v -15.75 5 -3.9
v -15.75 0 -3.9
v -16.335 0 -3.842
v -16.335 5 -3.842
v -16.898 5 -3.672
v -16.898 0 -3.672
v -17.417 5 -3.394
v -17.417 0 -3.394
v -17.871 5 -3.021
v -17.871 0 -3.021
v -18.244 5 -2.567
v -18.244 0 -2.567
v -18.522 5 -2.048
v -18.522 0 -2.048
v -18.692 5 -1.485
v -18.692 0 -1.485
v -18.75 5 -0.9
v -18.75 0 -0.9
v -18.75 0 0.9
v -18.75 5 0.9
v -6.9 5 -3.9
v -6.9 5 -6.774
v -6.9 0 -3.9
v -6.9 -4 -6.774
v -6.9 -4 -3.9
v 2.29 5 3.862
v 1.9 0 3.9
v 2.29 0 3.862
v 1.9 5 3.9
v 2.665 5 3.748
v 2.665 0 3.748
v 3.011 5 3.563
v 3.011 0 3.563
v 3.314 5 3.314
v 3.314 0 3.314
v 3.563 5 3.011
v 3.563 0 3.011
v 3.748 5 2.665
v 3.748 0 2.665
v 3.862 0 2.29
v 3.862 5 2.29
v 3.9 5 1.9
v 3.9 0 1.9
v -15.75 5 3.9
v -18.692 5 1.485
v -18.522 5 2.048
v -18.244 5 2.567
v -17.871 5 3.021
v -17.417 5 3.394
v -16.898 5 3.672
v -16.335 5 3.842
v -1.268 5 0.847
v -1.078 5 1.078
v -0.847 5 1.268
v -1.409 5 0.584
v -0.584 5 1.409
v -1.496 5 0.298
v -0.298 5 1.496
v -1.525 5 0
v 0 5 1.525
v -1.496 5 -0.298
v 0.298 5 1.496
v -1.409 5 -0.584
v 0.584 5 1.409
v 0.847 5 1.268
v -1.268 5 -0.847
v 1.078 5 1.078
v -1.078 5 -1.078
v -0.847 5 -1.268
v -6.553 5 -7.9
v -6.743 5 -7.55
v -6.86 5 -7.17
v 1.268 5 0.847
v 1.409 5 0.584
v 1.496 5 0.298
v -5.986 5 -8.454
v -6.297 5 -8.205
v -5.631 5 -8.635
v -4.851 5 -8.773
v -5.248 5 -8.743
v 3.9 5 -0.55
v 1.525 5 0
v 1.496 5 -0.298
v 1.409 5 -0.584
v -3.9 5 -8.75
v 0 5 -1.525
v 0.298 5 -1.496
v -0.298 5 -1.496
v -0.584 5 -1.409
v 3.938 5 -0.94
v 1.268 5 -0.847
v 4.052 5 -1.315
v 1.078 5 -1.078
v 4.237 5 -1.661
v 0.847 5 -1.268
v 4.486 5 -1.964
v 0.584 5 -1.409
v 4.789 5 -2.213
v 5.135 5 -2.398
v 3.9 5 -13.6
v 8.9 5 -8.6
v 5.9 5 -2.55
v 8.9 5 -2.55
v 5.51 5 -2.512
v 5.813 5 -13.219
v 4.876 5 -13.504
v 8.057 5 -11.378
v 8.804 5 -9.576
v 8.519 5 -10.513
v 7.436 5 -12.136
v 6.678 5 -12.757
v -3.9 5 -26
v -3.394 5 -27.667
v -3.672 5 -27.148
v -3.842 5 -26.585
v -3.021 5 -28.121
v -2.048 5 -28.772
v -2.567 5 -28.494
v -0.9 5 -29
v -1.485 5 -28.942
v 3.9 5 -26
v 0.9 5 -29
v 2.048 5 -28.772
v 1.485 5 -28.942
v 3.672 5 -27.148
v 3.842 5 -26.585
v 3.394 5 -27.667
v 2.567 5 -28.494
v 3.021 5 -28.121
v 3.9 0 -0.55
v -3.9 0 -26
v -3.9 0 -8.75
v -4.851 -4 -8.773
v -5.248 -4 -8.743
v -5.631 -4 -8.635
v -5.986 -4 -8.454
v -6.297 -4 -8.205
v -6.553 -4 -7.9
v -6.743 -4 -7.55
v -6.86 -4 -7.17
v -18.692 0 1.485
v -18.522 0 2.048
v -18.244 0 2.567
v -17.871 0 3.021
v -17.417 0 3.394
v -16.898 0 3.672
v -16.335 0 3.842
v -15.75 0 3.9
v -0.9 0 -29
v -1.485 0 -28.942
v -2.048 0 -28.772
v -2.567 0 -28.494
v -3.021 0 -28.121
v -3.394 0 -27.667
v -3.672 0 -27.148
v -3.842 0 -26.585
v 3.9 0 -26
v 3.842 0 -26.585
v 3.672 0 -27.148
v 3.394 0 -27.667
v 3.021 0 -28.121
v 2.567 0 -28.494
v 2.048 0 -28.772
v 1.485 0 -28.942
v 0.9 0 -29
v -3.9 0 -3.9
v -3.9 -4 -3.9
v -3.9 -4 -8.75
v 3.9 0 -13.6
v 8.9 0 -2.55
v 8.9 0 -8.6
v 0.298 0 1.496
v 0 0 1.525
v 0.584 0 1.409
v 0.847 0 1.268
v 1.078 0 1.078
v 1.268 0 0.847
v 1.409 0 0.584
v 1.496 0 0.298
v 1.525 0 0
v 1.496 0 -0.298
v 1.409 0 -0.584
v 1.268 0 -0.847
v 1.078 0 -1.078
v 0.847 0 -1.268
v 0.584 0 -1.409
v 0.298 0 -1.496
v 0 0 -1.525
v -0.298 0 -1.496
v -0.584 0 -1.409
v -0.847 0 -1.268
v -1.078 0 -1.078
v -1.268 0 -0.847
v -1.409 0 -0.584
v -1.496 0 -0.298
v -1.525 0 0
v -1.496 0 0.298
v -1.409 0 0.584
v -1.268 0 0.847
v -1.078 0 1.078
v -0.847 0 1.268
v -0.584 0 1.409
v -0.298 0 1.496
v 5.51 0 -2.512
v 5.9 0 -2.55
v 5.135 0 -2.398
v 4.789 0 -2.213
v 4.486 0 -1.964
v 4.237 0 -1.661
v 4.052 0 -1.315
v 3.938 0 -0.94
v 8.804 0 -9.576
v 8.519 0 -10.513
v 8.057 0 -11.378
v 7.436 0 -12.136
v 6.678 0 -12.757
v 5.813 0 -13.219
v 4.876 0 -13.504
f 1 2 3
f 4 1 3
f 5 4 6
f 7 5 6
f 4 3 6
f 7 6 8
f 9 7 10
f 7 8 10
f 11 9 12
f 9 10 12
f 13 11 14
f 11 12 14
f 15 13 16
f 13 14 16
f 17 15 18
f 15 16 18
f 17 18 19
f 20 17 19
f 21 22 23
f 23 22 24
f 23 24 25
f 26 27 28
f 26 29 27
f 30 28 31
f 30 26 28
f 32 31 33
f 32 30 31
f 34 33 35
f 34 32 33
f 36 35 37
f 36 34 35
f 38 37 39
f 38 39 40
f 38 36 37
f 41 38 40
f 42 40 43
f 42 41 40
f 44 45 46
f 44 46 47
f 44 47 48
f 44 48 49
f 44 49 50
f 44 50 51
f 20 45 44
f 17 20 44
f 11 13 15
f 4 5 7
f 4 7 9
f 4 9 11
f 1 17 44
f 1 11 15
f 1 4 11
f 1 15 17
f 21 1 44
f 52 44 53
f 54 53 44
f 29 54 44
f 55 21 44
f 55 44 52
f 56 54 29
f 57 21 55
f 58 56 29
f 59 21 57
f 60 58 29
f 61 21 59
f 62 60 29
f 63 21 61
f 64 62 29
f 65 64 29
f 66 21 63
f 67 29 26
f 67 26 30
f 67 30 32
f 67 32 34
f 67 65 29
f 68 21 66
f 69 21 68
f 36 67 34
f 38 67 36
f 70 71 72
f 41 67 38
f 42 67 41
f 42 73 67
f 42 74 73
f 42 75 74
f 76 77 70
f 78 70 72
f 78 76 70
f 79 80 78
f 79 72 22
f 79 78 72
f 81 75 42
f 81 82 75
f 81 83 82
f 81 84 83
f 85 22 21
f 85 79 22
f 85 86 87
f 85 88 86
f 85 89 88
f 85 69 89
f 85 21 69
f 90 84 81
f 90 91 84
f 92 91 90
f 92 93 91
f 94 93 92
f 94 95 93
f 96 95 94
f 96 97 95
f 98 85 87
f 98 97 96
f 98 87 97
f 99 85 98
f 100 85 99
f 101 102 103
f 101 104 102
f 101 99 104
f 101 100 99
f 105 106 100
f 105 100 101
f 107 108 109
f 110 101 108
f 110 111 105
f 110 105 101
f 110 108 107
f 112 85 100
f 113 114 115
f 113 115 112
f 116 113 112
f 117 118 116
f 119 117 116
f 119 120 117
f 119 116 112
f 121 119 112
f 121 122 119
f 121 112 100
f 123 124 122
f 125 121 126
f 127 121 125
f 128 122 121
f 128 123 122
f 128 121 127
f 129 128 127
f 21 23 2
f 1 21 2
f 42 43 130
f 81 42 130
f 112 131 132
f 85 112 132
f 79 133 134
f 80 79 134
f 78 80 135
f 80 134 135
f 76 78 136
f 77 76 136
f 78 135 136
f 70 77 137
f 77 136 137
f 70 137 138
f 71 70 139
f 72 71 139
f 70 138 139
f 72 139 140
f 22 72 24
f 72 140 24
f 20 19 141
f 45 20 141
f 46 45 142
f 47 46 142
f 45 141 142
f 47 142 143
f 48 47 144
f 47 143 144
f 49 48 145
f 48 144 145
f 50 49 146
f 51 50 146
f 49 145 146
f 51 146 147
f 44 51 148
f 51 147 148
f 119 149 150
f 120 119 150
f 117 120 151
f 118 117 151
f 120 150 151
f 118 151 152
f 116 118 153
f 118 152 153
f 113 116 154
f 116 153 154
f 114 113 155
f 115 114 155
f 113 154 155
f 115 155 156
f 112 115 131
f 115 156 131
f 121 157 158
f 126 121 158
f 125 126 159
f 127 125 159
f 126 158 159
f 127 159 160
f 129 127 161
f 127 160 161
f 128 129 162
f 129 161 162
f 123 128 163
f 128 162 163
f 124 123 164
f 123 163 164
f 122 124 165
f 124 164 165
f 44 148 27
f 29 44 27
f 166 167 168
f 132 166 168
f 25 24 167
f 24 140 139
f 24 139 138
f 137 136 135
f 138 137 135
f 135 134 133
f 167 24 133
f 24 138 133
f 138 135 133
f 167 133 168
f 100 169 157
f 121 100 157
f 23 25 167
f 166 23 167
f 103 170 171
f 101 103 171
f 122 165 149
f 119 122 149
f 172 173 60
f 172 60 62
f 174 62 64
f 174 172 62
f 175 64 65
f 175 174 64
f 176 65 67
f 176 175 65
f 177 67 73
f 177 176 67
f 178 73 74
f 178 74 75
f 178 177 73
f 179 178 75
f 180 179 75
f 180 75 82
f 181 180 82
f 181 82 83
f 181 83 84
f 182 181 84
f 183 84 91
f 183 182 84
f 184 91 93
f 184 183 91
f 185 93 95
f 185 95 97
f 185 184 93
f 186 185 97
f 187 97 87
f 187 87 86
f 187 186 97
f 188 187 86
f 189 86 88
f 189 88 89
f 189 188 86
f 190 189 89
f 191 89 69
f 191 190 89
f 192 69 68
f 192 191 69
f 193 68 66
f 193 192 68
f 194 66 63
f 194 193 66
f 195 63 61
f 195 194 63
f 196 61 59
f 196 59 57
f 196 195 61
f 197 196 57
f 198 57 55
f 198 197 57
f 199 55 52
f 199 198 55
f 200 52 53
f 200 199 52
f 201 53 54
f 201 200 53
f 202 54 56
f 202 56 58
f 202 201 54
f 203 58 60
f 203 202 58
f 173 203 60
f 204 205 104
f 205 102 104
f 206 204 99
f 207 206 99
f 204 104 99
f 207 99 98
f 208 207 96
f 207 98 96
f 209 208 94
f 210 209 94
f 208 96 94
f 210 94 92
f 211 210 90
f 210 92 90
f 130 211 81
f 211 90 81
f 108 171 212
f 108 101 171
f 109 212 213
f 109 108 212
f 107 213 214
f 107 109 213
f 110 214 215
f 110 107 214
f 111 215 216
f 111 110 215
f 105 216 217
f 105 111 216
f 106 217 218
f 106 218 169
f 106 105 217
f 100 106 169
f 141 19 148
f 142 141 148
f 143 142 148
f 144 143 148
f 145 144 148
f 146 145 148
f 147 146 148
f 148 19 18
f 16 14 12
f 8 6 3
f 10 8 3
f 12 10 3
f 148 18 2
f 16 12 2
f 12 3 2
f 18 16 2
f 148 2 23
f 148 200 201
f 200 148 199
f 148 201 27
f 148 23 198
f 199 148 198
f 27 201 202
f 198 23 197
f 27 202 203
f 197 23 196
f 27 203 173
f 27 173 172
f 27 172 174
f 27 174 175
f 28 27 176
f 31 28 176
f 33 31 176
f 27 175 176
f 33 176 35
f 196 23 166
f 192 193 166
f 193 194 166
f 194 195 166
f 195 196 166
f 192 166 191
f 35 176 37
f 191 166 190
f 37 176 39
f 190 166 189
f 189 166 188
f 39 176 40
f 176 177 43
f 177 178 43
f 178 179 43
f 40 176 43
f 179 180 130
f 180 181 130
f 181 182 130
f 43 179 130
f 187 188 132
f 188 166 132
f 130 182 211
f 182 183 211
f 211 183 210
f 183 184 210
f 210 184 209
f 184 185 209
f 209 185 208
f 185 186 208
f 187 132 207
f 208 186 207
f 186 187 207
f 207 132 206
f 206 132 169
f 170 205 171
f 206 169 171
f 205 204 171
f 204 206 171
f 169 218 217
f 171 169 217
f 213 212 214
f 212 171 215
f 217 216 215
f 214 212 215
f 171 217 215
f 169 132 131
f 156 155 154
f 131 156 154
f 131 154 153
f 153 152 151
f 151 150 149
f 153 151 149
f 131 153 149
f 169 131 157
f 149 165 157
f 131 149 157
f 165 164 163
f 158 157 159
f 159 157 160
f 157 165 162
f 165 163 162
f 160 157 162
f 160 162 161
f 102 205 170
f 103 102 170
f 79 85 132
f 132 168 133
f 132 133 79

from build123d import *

# Parameters (mm, degrees)
SKETCH_1_R      = 1.525
EXTRUDE_1_DEPTH = 5
EXTRUDE_START   = -4
EXTRUDE_4_DEPTH = 4
FILLET_1_R      = 2
FILLET_2_R      = 5
FILLET_3_R      = 2


with BuildPart() as part:
    # 草图1 → 凸台-拉伸1 (new body)
    with BuildSketch(Plane(origin=(0, 0, 0), x_dir=(1, 0, 0), z_dir=(0, 1, 0))):
        with BuildLine():
            Line((3.9, -3.732227301), (3.9, 2.55))
            Line((3.9, 2.55), (5.747877547, 2.55))
            Line((5.747877547, 2.55), (8.9, 2.55))
            Line((8.9, 2.55), (8.9, 13.6))
            Line((8.9, 13.6), (3.9, 13.6))
            Line((3.9, 13.6), (3.9, 13.765734151))
            Line((3.9, 13.765734151), (3.9, 26))
            ThreePointArc((3.9, 26), (3.021320344, 28.121320344), (0.9, 29))
            Line((0.9, 29), (-0.9, 29))
            ThreePointArc((-0.9, 29), (-3.021320344, 28.121320344), (-3.9, 26))
            Line((-3.9, 26), (-3.9, 8.75))
            Line((-3.9, 8.75), (-4.851185593, 8.773222699))
            ThreePointArc((-4.851185593, 8.773222699), (-6.29684845, 8.205186518), (-6.9, 6.773818499))
            Line((-6.9, 6.773818499), (-6.9, 3.9))
            Line((-6.9, 3.9), (-15.75, 3.9))
            ThreePointArc((-15.75, 3.9), (-17.871320344, 3.021320344), (-18.75, 0.9))
            Line((-18.75, 0.9), (-18.75, -0.9))
            ThreePointArc((-18.75, -0.9), (-17.871320344, -3.021320344), (-15.75, -3.9))
            Line((-15.75, -3.9), (0, -3.9))
            Line((0, -3.9), (3.9, -3.9))
            Line((3.9, -3.9), (3.9, -3.732227301))
        make_face()
        with Locations(Location((0, 0, 0), (0, 0, 270))):
            Circle(SKETCH_1_R, mode=Mode.SUBTRACT)
    extrude(amount=EXTRUDE_1_DEPTH)

    # 草图4 → 凸台-拉伸4 (add)
    with BuildSketch(Plane(origin=(0, 0, 0), x_dir=(1, 0, 0), z_dir=(0, 1, 0)).offset(EXTRUDE_START)):
        with BuildLine():
            Line((-6.9, 3.9), (-3.9, 3.9))
            Line((-3.9, 3.9), (-3.9, 8.75))
            Line((-3.9, 8.75), (-4.851185593, 8.773222699))
            ThreePointArc((-4.851185593, 8.773222699), (-6.29684845, 8.205186518), (-6.9, 6.773818499))
            Line((-6.9, 6.773818499), (-6.9, 3.9))
        make_face()
    extrude(amount=EXTRUDE_4_DEPTH)

    # 圆角1
    fillet_1_edges = [part.edges().sort_by_distance(p)[0] for p in [
        (3.9, 2.5, 3.9),
    ]]
    fillet(fillet_1_edges, radius=FILLET_1_R)

    # 圆角2
    fillet_2_edges = [part.edges().sort_by_distance(p)[0] for p in [
        (8.9, 2.5, -13.6),
    ]]
    fillet(fillet_2_edges, radius=FILLET_2_R - 0.0001)  # a hair under: the kernel refuses the full size

    # 圆角3
    fillet_3_edges = [part.edges().sort_by_distance(p)[0] for p in [
        (3.9, 2.5, -2.55),
    ]]
    fillet(fillet_3_edges, radius=FILLET_3_R)


solid = part.part
